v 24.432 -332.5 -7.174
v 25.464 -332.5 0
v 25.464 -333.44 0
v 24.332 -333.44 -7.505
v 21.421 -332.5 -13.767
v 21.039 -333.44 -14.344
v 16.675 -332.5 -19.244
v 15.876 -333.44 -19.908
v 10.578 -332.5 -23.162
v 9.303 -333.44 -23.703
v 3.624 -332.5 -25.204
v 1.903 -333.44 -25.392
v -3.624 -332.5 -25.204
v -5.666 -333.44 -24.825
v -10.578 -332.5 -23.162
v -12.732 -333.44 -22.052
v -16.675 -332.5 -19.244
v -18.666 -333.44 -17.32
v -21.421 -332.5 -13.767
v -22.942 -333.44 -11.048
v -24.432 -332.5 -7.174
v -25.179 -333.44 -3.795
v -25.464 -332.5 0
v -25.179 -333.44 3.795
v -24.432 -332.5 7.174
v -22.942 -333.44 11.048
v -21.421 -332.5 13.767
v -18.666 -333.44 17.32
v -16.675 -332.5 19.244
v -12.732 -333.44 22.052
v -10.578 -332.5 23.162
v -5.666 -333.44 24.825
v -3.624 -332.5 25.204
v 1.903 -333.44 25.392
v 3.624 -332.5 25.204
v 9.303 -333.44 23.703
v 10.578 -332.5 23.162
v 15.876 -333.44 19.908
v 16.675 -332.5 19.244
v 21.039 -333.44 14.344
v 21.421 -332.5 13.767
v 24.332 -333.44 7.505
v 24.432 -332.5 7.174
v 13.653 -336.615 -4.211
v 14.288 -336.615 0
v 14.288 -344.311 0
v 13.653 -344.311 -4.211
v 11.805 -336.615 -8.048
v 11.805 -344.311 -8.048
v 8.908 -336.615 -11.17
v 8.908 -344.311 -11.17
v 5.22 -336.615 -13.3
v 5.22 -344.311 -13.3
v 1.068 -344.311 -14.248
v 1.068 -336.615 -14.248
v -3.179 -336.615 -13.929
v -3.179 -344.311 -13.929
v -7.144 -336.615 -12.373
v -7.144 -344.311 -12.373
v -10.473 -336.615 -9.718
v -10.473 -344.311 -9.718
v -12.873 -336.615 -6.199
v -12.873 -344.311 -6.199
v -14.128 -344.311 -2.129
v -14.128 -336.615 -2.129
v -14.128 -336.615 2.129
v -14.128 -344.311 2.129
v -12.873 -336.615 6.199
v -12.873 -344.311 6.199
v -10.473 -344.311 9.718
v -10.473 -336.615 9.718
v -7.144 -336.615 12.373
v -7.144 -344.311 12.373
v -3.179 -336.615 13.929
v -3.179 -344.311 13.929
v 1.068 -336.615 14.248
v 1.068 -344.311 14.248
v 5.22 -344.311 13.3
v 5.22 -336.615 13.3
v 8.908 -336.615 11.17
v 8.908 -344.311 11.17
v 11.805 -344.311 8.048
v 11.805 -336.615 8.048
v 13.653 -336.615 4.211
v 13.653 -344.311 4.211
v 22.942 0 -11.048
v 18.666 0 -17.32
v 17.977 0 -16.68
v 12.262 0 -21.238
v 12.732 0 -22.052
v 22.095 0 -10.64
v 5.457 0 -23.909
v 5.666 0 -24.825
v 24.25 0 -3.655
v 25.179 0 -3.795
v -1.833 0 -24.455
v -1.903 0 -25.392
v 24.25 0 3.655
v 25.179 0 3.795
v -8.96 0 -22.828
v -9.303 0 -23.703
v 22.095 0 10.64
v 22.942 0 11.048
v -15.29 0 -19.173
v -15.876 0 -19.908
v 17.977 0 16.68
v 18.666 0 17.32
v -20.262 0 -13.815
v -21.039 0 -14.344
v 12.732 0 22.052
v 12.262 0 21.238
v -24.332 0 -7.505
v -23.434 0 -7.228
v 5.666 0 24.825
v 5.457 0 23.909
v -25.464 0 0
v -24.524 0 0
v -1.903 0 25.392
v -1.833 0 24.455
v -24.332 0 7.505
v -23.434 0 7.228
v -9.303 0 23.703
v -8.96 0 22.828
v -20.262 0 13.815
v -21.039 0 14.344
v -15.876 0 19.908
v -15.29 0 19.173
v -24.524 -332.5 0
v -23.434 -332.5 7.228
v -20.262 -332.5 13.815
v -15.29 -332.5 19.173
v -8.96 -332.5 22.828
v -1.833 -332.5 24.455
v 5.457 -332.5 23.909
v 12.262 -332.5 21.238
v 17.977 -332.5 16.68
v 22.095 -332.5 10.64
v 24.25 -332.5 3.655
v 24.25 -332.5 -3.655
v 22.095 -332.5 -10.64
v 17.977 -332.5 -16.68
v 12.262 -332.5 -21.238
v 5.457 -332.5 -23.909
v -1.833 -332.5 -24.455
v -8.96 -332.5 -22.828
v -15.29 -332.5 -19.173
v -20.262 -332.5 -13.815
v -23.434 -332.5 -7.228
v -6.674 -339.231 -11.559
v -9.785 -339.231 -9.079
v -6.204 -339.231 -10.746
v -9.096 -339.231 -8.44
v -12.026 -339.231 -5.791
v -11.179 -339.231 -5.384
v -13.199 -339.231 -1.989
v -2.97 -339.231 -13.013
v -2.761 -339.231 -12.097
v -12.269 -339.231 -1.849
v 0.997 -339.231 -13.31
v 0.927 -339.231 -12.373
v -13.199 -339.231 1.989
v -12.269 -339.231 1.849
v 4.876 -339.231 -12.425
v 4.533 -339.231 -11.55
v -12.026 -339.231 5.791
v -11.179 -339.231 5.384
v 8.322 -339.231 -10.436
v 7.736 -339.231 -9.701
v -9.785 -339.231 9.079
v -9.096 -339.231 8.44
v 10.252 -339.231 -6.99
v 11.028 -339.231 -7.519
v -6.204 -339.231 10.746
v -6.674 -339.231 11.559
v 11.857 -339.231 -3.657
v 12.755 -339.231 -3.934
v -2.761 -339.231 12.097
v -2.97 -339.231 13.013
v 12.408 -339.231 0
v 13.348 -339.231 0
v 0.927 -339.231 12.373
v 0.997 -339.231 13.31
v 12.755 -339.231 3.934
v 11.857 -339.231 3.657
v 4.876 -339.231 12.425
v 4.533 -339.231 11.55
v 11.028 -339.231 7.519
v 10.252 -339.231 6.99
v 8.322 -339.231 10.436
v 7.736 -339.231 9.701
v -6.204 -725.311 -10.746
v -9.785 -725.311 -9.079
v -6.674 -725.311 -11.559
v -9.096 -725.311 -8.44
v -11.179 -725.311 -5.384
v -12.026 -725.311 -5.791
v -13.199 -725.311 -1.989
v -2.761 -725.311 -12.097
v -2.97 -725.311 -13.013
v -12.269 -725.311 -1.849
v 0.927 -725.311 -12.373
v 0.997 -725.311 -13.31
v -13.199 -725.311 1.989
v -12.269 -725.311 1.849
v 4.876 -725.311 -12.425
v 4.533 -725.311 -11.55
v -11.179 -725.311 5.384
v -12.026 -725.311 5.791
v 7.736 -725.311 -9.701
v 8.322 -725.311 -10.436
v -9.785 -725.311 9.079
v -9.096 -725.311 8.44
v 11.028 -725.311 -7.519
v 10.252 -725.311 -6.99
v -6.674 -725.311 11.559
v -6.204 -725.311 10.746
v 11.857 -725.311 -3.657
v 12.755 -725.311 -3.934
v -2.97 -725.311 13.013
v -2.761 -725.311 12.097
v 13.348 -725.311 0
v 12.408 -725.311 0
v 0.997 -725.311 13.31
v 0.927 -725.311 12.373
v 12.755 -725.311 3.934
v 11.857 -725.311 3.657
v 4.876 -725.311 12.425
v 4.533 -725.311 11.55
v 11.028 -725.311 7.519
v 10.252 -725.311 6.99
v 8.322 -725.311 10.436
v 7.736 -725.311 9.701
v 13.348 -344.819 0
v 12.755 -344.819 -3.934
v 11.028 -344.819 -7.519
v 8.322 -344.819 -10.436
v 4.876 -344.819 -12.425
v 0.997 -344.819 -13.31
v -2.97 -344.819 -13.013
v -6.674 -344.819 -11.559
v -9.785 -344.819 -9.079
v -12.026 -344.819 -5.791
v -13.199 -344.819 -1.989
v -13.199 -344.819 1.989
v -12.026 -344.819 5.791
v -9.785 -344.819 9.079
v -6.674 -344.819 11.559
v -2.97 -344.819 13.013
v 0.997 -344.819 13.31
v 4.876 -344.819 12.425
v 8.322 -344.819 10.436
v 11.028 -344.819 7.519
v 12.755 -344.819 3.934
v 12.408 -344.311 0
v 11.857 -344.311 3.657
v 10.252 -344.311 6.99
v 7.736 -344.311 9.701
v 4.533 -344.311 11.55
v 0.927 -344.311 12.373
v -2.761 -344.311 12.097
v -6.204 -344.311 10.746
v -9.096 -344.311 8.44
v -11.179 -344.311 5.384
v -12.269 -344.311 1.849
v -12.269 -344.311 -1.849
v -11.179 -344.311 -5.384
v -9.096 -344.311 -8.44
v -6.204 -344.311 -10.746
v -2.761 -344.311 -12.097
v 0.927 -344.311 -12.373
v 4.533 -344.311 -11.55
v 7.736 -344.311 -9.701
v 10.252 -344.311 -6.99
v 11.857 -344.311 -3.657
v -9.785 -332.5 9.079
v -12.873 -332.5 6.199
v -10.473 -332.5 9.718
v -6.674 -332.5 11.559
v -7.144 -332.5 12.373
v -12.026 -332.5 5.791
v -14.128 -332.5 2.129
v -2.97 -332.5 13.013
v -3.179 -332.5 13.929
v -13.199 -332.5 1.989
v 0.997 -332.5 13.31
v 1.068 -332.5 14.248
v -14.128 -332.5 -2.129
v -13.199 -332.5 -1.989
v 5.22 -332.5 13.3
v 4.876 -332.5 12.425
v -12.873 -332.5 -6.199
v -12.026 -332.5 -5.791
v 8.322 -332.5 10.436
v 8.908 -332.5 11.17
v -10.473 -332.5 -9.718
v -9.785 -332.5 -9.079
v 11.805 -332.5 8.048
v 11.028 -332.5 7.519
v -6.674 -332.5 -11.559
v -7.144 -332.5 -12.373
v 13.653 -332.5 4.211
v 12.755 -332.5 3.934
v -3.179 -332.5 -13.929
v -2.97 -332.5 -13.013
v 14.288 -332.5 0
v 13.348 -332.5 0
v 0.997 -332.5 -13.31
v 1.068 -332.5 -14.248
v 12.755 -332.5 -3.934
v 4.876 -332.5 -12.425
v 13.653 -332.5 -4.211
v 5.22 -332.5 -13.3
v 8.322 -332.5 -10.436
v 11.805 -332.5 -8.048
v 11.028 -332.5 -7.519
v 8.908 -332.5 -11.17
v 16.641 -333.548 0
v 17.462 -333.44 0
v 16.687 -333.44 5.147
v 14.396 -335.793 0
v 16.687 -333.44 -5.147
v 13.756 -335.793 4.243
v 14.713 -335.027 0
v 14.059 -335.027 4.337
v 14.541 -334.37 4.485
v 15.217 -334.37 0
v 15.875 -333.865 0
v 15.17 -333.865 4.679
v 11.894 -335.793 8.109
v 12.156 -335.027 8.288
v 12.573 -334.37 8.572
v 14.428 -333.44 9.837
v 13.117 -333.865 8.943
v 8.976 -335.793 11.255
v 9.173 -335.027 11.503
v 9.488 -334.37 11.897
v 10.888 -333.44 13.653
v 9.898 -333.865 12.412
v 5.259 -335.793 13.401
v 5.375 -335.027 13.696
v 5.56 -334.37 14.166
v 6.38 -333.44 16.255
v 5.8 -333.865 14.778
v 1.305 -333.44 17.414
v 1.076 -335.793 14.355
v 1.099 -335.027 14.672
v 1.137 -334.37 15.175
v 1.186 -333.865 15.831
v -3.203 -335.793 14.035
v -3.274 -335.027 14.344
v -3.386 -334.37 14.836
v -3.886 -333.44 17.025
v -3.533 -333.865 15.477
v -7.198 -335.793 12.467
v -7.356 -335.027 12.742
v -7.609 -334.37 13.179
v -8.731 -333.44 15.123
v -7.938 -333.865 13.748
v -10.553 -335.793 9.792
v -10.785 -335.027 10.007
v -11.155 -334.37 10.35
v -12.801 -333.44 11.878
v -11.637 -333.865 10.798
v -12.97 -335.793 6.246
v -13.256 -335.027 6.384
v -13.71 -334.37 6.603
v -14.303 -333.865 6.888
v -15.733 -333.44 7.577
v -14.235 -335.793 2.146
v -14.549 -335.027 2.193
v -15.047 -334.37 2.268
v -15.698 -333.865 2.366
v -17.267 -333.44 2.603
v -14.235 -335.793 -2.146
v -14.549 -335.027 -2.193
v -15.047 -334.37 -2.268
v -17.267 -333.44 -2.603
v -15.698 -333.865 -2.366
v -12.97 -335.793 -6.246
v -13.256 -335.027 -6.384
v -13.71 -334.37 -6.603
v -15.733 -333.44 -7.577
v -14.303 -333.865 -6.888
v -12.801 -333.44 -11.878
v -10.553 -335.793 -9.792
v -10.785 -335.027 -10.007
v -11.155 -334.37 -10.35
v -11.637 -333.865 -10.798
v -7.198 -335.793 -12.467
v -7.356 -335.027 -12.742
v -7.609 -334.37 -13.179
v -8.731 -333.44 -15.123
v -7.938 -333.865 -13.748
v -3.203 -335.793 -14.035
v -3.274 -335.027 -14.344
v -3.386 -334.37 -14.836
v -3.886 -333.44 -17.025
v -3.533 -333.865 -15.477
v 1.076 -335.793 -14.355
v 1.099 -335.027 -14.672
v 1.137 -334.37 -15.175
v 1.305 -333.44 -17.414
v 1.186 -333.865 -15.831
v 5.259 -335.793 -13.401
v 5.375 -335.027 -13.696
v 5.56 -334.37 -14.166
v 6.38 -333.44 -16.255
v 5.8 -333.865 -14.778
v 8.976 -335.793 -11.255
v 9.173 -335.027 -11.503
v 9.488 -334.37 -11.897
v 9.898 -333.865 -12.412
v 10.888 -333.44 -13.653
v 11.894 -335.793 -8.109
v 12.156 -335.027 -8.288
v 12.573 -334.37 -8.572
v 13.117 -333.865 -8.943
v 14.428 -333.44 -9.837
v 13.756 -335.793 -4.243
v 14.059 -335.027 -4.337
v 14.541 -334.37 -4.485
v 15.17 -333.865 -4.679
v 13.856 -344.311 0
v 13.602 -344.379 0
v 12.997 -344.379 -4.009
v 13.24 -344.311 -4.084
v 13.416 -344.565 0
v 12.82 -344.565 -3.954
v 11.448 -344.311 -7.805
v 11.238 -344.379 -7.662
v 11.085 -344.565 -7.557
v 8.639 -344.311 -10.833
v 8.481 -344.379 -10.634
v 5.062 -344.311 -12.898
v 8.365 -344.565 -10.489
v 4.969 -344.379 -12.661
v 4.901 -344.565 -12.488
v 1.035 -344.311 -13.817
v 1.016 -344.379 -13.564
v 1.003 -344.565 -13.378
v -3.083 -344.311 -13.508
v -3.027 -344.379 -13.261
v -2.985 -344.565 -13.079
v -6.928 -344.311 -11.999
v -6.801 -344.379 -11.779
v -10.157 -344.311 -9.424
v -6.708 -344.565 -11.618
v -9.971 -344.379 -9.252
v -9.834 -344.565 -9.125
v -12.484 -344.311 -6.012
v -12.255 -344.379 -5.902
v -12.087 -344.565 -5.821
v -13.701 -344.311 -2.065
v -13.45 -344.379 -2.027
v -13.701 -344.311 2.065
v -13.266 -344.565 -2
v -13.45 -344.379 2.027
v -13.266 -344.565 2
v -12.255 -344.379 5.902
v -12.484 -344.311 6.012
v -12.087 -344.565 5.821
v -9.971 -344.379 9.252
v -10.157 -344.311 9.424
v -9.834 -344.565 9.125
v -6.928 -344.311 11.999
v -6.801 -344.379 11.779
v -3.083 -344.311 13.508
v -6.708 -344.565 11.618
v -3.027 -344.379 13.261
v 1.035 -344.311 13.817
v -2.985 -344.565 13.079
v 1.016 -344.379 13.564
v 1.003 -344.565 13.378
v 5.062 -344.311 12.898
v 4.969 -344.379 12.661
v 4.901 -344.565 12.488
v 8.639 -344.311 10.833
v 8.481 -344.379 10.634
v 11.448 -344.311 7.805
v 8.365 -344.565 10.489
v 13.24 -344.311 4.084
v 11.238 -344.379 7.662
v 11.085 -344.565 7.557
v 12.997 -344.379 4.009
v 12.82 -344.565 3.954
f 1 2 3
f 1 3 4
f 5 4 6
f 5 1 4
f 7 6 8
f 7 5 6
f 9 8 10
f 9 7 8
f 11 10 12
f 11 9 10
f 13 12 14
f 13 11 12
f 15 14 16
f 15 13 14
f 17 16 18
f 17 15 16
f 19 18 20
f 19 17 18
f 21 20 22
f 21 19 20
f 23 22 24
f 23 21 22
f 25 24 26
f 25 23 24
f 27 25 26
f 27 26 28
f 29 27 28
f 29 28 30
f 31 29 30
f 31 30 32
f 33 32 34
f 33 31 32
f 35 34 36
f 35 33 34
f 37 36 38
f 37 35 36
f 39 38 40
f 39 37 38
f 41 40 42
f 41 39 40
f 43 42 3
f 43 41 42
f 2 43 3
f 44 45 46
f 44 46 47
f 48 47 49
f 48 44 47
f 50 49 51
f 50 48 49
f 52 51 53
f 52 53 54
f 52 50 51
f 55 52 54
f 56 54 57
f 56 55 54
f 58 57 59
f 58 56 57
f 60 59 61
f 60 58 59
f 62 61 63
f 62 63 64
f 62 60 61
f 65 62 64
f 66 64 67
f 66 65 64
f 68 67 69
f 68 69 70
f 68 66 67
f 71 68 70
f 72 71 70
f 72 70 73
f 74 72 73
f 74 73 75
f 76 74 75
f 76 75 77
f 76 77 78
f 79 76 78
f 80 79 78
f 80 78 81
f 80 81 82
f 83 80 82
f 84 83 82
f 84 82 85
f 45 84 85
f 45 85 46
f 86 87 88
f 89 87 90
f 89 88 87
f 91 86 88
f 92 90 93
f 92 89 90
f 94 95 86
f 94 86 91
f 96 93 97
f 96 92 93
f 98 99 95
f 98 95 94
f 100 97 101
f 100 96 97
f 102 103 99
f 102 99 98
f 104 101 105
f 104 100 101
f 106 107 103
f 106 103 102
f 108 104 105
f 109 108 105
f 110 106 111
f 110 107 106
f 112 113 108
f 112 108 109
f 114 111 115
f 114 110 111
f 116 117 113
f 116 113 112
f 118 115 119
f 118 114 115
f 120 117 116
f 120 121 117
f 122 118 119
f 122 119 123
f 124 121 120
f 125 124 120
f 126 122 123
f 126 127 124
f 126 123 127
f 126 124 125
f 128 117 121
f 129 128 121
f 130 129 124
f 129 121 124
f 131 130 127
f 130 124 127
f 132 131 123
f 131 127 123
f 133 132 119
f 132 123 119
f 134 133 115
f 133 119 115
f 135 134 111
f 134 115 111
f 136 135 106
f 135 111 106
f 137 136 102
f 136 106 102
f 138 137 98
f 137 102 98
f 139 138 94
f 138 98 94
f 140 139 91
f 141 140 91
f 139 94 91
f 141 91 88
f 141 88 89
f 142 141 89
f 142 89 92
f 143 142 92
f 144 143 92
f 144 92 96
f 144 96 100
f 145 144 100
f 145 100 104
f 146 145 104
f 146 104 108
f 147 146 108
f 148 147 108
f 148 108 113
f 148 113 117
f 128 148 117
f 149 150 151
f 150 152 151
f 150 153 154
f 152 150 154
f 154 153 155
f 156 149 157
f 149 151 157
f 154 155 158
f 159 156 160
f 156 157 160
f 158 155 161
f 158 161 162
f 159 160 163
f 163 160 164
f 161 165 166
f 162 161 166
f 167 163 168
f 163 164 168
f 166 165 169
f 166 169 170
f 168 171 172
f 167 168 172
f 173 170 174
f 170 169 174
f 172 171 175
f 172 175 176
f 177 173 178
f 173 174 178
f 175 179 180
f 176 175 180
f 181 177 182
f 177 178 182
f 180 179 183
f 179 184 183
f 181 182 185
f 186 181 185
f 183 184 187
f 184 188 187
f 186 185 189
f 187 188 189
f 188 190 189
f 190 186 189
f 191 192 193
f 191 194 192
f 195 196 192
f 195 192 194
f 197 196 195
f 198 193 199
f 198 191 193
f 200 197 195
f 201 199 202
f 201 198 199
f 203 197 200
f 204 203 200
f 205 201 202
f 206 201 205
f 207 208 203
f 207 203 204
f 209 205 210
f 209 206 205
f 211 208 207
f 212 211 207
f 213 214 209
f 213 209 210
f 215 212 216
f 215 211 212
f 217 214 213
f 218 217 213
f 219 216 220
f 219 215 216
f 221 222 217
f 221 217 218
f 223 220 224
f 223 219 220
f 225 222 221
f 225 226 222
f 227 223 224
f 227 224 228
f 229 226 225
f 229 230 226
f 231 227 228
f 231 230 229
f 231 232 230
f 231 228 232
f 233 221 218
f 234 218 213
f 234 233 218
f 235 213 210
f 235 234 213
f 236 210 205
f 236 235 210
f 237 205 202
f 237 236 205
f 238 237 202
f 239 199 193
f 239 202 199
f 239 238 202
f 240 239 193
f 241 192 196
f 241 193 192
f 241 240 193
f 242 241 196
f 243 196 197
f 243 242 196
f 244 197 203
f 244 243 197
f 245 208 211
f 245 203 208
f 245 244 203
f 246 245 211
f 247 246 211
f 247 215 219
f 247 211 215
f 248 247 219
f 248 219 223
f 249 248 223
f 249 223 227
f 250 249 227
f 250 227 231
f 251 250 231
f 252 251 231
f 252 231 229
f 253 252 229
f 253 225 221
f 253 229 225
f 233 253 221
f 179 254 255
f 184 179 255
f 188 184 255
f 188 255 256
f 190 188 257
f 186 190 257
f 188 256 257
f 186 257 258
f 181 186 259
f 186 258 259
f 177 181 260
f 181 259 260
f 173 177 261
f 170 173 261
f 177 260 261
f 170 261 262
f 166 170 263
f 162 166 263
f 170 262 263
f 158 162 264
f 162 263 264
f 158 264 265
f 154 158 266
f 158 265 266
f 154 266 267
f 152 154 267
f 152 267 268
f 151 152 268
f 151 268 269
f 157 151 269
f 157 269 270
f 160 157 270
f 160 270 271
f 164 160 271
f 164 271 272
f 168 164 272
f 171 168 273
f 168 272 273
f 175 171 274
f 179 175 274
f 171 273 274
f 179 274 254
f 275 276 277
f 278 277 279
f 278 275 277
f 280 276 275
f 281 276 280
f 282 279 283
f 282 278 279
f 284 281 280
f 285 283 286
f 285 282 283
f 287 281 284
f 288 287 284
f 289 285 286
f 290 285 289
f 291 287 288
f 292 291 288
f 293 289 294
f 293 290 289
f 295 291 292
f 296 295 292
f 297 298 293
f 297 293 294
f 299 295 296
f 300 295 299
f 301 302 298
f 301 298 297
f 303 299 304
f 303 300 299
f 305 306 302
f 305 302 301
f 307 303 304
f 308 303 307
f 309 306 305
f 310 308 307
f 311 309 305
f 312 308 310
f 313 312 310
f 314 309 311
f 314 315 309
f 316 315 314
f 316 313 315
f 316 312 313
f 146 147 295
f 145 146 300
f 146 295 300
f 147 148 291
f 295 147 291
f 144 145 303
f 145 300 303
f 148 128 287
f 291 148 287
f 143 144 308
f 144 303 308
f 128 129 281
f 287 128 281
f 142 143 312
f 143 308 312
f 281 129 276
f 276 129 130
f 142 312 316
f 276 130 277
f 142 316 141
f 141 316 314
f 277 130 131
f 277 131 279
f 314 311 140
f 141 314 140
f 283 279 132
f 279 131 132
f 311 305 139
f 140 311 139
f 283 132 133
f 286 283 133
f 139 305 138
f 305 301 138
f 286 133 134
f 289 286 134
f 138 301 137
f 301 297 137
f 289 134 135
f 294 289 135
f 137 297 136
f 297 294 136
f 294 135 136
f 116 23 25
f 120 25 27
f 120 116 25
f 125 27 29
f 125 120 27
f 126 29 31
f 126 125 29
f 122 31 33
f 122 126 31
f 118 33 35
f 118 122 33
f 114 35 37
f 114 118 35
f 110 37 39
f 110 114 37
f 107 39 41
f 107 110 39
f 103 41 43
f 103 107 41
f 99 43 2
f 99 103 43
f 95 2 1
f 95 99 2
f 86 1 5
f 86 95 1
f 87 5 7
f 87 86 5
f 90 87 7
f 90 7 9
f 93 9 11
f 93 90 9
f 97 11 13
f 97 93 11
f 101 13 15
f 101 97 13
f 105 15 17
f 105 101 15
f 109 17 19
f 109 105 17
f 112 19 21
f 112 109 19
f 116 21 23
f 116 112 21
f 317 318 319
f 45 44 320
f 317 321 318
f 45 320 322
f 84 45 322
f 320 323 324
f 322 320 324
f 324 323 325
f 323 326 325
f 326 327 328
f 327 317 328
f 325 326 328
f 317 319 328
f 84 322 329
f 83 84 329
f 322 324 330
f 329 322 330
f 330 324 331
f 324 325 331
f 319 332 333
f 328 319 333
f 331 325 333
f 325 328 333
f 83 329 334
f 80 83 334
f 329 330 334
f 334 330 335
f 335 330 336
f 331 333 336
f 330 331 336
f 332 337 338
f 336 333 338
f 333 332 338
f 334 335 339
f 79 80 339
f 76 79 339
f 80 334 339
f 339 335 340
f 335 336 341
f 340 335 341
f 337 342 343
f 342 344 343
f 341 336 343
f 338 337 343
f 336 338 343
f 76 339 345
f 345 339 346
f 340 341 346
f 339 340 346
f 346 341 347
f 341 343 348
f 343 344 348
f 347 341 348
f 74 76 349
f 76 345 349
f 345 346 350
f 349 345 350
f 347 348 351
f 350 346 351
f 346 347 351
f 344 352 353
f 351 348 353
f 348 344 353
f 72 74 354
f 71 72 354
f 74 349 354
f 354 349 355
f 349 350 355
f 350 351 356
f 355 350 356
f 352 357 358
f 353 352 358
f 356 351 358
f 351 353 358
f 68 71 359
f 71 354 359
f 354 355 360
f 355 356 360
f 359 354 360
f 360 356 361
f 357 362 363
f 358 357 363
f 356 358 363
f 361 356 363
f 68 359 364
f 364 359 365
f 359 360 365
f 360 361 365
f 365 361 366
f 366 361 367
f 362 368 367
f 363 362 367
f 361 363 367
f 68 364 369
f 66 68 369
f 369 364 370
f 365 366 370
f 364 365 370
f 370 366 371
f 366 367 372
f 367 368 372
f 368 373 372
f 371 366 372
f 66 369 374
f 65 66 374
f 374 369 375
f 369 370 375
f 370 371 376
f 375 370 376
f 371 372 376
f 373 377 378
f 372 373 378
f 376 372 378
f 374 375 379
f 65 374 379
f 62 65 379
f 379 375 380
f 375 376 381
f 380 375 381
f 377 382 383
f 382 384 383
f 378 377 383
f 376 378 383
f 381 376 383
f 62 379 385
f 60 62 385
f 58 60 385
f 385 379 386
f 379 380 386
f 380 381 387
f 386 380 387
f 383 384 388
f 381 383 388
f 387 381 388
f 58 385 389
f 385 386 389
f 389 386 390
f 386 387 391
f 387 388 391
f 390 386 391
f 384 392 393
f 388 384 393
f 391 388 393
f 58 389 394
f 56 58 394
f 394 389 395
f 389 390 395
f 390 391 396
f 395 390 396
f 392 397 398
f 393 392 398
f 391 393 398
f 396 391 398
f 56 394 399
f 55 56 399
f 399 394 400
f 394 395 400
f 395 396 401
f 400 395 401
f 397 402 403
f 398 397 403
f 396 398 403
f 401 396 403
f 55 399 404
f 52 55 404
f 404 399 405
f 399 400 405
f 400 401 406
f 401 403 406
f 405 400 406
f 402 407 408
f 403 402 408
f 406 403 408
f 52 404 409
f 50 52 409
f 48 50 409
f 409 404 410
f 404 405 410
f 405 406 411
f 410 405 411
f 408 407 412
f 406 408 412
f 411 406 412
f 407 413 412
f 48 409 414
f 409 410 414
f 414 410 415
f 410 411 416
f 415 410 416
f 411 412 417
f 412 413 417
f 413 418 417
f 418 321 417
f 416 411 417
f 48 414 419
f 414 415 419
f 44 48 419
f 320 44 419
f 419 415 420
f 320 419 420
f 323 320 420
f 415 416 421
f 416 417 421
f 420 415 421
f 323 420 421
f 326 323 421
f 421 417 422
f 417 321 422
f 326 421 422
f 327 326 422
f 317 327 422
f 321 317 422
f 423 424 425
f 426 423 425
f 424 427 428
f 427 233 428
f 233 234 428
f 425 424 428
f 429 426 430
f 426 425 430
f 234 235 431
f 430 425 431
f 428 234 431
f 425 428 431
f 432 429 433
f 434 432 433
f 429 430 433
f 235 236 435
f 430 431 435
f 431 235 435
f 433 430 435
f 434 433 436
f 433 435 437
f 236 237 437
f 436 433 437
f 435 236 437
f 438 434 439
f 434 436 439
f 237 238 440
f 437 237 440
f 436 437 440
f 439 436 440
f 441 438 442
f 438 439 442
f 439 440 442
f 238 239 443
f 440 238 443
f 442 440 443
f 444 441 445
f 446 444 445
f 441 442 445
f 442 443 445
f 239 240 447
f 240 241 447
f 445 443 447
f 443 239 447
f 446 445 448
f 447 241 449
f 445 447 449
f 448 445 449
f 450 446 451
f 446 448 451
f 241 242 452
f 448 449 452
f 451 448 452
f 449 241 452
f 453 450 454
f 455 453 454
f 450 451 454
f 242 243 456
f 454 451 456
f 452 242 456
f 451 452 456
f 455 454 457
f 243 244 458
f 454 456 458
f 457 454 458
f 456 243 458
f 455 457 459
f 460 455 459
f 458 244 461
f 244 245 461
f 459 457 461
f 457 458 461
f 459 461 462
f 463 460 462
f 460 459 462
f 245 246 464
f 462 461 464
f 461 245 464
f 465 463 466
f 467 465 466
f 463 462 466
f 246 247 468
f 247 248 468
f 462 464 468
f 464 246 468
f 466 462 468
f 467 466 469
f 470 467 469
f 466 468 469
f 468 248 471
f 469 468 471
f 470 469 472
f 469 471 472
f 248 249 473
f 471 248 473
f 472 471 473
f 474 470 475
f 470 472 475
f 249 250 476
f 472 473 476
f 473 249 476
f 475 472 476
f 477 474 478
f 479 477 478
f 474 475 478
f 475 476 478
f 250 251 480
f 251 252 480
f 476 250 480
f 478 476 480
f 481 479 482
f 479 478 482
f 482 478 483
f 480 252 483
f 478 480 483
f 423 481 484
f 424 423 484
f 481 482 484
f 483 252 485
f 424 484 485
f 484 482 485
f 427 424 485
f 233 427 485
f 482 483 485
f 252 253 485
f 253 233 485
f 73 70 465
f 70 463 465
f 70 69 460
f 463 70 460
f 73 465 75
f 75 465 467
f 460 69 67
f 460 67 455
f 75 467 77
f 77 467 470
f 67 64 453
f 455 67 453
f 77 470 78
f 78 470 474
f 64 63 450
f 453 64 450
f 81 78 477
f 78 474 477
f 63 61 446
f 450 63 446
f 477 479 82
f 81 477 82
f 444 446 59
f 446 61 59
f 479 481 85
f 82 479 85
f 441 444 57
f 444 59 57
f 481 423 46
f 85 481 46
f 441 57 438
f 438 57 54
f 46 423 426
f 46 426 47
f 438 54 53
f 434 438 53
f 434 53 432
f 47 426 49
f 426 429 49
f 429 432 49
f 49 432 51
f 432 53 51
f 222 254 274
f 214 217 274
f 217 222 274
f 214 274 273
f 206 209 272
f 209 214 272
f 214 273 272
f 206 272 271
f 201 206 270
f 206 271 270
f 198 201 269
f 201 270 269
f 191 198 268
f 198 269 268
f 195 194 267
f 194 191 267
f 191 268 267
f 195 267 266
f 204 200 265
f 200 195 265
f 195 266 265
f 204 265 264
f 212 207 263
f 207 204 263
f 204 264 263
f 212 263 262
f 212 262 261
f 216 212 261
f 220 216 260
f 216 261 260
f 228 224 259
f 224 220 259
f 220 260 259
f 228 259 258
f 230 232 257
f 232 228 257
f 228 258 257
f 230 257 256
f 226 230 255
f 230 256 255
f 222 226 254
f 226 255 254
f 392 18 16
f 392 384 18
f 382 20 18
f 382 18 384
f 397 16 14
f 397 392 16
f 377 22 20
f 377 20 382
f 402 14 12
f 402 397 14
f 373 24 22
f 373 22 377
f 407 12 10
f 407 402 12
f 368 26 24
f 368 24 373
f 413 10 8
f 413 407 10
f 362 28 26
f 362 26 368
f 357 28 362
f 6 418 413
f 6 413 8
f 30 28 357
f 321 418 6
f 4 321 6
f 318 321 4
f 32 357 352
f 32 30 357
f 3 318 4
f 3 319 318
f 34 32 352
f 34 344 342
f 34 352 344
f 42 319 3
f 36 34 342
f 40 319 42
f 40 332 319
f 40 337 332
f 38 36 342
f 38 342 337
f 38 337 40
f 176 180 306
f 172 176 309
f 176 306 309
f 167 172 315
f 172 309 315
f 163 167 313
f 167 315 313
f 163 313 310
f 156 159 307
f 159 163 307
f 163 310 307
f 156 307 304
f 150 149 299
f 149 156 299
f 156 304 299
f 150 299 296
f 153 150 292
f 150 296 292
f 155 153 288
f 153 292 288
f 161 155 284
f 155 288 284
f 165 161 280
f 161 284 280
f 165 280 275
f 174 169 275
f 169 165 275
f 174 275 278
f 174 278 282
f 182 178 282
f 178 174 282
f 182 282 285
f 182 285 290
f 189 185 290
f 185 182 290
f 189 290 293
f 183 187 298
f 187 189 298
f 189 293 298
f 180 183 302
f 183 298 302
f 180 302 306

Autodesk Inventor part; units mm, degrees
ref_plane "YZ Plane" through (0, 0, 0) normal (1, 0, 0) x (0, 1, 0)
ref_plane "XZ Plane" through (0, 0, 0) normal (0, 1, 0) x (-1, 0, 0)
ref_plane "XY Plane" through (0, 0, 0) normal (0, 0, 1) x (1, 0, 0)
sketch "Sketch1" plane through (0, 0, 0) normal (0, 1, 0) x (-1, 0, 0)
  circle A0 centre (0, 0) radius 25.4635
  circle A1 centre (0, 0) radius 24.5237
  dimension "d0" = 50.927
  dimension "d1" = 0.9398
extrude "Extrusion1" add sketch "Sketch1" against normal blind 332.5
sketch "Sketch2" plane through (0, -332.5, 0) normal (0, -1, 0) x (1, 0, 0)
  circle A0 centre (0, 0) radius 14.2875
  circle A1 centre (0, 0) radius 25.4635
  circle A2 centre (0, 0) radius 25.4635 projected
  dimension "d4" = 28.575
extrude "Extrusion2" add sketch "Sketch2" along normal blind 0.9398
sketch "Sketch3" plane through (0, -332.5, 0) normal (0, 1, 0) x (1, 0, 0)
  circle A0 centre (0, 0) radius 14.2875
  circle A1 centre (0, 0) radius 14.2875 projected
  circle A2 centre (0, 0) radius 13.3477
  dimension "d7" = 0.9398
extrude "Extrusion3" add sketch "Sketch3" against normal blind 11.811
sketch "Sketch4" plane through (0, -344.311, 0) normal (0, -1, 0) x (1, 0, 0)
  circle A0 centre (0, 0) radius 13.3477
  circle A1 centre (0, 0) radius 13.3477 projected
  circle A2 centre (0, 0) radius 12.4079
  dimension "d10" = 0.9398
extrude "Extrusion4" add sketch "Sketch4" along normal blind 381 and the other way blind 5.08
fillet "Fillet1" radius 3.175 1 edges at (-14.2875, -333.4398, 0)
fillet "Fillet2" radius 0.508 1 edges at (-13.3477, -344.311, 0)
properties part number "still pipe unmodified" material "Stainless Steel AISI 304"
